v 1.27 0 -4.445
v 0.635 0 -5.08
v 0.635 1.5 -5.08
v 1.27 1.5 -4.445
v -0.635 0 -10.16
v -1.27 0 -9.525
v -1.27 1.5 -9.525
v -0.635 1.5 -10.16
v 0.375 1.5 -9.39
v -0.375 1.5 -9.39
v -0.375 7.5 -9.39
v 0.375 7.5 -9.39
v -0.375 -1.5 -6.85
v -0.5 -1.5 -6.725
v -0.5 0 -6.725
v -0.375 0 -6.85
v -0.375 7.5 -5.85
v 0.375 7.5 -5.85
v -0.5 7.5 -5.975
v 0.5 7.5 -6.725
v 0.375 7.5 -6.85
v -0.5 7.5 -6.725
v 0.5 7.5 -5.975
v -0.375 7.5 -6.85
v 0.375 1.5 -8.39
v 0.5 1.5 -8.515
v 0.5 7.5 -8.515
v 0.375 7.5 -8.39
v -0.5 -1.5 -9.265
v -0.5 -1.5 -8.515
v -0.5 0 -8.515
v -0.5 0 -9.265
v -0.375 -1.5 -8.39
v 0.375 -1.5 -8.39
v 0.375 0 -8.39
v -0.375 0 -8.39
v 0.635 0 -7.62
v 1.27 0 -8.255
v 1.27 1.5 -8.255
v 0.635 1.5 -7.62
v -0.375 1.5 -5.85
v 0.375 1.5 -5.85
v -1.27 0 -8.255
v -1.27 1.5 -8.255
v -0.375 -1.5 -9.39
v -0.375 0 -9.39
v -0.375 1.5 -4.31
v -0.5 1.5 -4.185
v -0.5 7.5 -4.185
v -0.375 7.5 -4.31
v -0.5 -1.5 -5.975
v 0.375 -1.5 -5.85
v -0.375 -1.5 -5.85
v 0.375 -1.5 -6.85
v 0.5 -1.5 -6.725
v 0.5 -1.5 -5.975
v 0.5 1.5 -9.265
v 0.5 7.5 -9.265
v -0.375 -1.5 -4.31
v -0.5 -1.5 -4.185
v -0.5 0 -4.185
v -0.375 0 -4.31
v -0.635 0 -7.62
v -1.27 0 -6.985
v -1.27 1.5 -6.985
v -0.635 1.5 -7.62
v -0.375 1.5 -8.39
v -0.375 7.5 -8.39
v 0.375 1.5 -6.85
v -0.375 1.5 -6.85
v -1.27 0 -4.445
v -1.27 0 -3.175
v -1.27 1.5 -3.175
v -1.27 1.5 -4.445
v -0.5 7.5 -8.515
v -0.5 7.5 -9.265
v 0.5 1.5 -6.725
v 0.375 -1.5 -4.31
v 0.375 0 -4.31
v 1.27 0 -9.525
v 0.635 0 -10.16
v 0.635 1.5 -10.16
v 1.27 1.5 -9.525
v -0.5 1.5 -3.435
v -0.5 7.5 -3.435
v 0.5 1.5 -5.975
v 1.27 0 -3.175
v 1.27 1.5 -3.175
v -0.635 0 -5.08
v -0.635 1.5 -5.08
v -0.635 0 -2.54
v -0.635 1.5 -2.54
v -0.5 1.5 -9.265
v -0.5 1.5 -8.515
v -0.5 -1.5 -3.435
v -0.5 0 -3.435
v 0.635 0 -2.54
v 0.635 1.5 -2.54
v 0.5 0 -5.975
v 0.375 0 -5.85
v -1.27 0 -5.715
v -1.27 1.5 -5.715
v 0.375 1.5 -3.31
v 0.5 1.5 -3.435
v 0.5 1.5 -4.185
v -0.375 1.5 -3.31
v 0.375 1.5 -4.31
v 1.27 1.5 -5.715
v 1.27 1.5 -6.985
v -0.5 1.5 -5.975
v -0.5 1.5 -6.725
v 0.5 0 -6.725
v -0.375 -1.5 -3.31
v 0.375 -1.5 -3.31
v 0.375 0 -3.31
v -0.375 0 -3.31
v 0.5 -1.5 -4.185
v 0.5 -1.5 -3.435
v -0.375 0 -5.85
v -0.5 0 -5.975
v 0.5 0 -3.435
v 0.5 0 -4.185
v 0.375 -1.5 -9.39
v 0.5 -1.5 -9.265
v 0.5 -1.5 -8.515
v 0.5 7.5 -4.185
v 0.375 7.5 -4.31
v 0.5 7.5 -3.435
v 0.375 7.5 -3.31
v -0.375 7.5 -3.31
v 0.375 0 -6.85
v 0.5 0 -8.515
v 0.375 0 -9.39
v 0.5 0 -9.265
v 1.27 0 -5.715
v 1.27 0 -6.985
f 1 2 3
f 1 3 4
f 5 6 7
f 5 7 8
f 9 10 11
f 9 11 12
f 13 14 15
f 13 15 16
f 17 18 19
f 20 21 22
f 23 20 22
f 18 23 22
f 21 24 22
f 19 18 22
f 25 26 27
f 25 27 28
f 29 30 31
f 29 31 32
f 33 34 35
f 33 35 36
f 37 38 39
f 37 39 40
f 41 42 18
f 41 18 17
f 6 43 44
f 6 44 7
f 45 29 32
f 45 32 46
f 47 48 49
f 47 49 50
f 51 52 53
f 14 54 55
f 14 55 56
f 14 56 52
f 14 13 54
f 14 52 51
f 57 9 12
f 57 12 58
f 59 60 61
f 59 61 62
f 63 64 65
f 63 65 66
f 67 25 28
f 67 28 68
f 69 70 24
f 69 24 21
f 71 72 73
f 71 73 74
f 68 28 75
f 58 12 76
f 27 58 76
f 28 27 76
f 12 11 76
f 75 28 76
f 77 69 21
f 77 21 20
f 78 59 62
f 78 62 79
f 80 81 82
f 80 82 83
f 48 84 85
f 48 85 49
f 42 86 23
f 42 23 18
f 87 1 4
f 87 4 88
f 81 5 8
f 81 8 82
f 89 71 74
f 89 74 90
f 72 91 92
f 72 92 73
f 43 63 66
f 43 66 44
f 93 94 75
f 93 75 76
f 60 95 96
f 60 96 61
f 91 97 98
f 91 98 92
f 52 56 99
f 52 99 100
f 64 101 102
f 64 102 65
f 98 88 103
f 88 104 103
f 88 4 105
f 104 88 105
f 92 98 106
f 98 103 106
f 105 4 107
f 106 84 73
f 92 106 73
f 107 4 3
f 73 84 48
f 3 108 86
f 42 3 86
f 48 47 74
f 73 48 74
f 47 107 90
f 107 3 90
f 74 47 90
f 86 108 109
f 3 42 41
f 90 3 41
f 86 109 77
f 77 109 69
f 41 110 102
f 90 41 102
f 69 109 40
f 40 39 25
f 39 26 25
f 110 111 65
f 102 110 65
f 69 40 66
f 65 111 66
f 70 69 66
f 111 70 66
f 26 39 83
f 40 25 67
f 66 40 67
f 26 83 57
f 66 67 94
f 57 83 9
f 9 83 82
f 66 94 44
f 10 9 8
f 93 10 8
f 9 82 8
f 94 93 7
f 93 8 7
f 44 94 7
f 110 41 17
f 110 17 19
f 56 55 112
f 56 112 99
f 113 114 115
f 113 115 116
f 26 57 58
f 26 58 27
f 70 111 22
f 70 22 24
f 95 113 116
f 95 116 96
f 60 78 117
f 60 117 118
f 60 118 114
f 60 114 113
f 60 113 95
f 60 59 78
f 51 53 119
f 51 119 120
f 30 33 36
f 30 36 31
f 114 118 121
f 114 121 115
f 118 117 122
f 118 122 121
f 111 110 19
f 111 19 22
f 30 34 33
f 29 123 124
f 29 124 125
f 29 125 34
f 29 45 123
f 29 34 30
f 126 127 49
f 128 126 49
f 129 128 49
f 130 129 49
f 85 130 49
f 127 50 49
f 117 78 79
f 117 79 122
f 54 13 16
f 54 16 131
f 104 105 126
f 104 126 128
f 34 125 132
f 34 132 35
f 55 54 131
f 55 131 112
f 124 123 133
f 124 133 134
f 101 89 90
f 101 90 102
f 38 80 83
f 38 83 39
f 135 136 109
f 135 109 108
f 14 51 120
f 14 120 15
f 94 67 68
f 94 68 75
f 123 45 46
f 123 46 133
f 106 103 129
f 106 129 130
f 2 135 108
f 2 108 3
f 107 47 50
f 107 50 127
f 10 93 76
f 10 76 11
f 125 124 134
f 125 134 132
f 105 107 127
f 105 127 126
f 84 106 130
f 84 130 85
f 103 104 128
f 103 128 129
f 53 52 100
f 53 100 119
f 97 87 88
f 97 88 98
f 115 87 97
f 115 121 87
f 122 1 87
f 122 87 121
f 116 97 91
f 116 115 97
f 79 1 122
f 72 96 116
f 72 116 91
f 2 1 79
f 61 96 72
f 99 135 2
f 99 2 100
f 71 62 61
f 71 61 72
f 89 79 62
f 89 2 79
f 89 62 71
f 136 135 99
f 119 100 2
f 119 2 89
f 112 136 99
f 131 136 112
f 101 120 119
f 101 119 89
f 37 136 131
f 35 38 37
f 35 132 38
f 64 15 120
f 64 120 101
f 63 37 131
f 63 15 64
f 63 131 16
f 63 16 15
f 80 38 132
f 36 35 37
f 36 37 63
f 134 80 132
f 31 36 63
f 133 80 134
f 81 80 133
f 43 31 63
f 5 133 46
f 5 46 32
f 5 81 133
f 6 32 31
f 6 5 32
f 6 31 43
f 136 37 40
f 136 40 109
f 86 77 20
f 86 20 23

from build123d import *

# Parameters (mm, degrees)
BOSS_EXTRUDE1_DEPTH      = 1.5
BOSS_EXTRUDE2_DEPTH      = 6
BOSS_EXTRUDE2_DEPTH_BACK = 3
CUT_EXTRUDE1_DEPTH       = 13.69206445
CUT_EXTRUDE1_DEPTH_BACK  = 13.69206445


with BuildPart() as part:
    # Sketch1 → Boss-Extrude1 (new body)
    with BuildSketch(Plane(origin=(0, 0, 0), x_dir=(1, 0, 0), z_dir=(0, 1, 0))):
        Polygon((-0.635, 10.16), (0.635, 10.16), (1.27, 9.525), (1.27, 8.255), (0.635, 7.62), (1.27, 6.985), (1.27, 5.715), (0.635, 5.08), (1.27, 4.445), (1.27, 3.175), (0.635, 2.54), (1.27, 1.905), (1.27, 0.635), (0.635, 0), (1.27, -0.635), (1.27, -1.905), (0.635, -2.54), (1.27, -3.175), (1.27, -4.445), (0.635, -5.08), (-0.635, -5.08), (-1.27, -4.445), (-1.27, -3.175), (-0.635, -2.54), (-1.27, -1.905), (-1.27, -0.635), (-0.635, 0), (-1.27, 0.635), (-1.27, 1.905), (-0.635, 2.54), (-1.27, 3.175), (-1.27, 4.445), (-0.635, 5.08), (-1.27, 5.715), (-1.27, 6.985), (-0.635, 7.62), (-1.27, 8.255), (-1.27, 9.525), align=None)
    extrude(amount=BOSS_EXTRUDE1_DEPTH)

    # Sketch3 → Boss-Extrude2 (add, two sides: drawn at the far end of the back side and taken through both)
    with BuildSketch(Plane(origin=(0, 1.5, 0), x_dir=(1, 0, 0), z_dir=(0, 1, 0)).offset(-BOSS_EXTRUDE2_DEPTH_BACK)):
        Polygon((0.375, 9.39), (0.5, 9.265), (0.5, 8.515), (0.375, 8.39), (-0.375, 8.39), (-0.5, 8.515), (-0.5, 9.265), (-0.375, 9.39), align=None)
        Polygon((0.375, 6.85), (0.5, 6.725), (0.5, 5.975), (0.375, 5.85), (-0.375, 5.85), (-0.5, 5.975), (-0.5, 6.725), (-0.375, 6.85), align=None)
        Polygon((0.375, 4.31), (0.5, 4.185), (0.5, 3.435), (0.375, 3.31), (-0.375, 3.31), (-0.5, 3.435), (-0.5, 4.185), (-0.375, 4.31), align=None)
        Polygon((0.375, 1.77), (0.5, 1.645), (0.5, 0.895), (0.375, 0.77), (-0.375, 0.77), (-0.5, 0.895), (-0.5, 1.645), (-0.375, 1.77), align=None)
        Polygon((0.375, -0.77), (0.5, -0.895), (0.5, -1.645), (0.375, -1.77), (-0.375, -1.77), (-0.5, -1.645), (-0.5, -0.895), (-0.375, -0.77), align=None)
        Polygon((0.375, -3.31), (0.5, -3.435), (0.5, -4.185), (0.375, -4.31), (-0.375, -4.31), (-0.5, -4.185), (-0.5, -3.435), (-0.375, -3.31), align=None)
    extrude(amount=BOSS_EXTRUDE2_DEPTH + BOSS_EXTRUDE2_DEPTH_BACK)

    # Sketch4 → Cut-Extrude1 (cut, two sides: drawn at the far end of the back side and taken through both)
    with BuildSketch(Plane(origin=(0, 0, 0), x_dir=(1, 0, 0), z_dir=(0, 1, 0)).offset(-CUT_EXTRUDE1_DEPTH_BACK)):
        Polygon((0.635, 2.54), (-0.635, 2.54), (-3.551273802, 2.145414022), (-3.551273802, -5.54901255), (3.518391637, -6.305302341), (3.518391637, 1.323359901), align=None)
    extrude(amount=CUT_EXTRUDE1_DEPTH + CUT_EXTRUDE1_DEPTH_BACK, mode=Mode.SUBTRACT)


solid = part.part
